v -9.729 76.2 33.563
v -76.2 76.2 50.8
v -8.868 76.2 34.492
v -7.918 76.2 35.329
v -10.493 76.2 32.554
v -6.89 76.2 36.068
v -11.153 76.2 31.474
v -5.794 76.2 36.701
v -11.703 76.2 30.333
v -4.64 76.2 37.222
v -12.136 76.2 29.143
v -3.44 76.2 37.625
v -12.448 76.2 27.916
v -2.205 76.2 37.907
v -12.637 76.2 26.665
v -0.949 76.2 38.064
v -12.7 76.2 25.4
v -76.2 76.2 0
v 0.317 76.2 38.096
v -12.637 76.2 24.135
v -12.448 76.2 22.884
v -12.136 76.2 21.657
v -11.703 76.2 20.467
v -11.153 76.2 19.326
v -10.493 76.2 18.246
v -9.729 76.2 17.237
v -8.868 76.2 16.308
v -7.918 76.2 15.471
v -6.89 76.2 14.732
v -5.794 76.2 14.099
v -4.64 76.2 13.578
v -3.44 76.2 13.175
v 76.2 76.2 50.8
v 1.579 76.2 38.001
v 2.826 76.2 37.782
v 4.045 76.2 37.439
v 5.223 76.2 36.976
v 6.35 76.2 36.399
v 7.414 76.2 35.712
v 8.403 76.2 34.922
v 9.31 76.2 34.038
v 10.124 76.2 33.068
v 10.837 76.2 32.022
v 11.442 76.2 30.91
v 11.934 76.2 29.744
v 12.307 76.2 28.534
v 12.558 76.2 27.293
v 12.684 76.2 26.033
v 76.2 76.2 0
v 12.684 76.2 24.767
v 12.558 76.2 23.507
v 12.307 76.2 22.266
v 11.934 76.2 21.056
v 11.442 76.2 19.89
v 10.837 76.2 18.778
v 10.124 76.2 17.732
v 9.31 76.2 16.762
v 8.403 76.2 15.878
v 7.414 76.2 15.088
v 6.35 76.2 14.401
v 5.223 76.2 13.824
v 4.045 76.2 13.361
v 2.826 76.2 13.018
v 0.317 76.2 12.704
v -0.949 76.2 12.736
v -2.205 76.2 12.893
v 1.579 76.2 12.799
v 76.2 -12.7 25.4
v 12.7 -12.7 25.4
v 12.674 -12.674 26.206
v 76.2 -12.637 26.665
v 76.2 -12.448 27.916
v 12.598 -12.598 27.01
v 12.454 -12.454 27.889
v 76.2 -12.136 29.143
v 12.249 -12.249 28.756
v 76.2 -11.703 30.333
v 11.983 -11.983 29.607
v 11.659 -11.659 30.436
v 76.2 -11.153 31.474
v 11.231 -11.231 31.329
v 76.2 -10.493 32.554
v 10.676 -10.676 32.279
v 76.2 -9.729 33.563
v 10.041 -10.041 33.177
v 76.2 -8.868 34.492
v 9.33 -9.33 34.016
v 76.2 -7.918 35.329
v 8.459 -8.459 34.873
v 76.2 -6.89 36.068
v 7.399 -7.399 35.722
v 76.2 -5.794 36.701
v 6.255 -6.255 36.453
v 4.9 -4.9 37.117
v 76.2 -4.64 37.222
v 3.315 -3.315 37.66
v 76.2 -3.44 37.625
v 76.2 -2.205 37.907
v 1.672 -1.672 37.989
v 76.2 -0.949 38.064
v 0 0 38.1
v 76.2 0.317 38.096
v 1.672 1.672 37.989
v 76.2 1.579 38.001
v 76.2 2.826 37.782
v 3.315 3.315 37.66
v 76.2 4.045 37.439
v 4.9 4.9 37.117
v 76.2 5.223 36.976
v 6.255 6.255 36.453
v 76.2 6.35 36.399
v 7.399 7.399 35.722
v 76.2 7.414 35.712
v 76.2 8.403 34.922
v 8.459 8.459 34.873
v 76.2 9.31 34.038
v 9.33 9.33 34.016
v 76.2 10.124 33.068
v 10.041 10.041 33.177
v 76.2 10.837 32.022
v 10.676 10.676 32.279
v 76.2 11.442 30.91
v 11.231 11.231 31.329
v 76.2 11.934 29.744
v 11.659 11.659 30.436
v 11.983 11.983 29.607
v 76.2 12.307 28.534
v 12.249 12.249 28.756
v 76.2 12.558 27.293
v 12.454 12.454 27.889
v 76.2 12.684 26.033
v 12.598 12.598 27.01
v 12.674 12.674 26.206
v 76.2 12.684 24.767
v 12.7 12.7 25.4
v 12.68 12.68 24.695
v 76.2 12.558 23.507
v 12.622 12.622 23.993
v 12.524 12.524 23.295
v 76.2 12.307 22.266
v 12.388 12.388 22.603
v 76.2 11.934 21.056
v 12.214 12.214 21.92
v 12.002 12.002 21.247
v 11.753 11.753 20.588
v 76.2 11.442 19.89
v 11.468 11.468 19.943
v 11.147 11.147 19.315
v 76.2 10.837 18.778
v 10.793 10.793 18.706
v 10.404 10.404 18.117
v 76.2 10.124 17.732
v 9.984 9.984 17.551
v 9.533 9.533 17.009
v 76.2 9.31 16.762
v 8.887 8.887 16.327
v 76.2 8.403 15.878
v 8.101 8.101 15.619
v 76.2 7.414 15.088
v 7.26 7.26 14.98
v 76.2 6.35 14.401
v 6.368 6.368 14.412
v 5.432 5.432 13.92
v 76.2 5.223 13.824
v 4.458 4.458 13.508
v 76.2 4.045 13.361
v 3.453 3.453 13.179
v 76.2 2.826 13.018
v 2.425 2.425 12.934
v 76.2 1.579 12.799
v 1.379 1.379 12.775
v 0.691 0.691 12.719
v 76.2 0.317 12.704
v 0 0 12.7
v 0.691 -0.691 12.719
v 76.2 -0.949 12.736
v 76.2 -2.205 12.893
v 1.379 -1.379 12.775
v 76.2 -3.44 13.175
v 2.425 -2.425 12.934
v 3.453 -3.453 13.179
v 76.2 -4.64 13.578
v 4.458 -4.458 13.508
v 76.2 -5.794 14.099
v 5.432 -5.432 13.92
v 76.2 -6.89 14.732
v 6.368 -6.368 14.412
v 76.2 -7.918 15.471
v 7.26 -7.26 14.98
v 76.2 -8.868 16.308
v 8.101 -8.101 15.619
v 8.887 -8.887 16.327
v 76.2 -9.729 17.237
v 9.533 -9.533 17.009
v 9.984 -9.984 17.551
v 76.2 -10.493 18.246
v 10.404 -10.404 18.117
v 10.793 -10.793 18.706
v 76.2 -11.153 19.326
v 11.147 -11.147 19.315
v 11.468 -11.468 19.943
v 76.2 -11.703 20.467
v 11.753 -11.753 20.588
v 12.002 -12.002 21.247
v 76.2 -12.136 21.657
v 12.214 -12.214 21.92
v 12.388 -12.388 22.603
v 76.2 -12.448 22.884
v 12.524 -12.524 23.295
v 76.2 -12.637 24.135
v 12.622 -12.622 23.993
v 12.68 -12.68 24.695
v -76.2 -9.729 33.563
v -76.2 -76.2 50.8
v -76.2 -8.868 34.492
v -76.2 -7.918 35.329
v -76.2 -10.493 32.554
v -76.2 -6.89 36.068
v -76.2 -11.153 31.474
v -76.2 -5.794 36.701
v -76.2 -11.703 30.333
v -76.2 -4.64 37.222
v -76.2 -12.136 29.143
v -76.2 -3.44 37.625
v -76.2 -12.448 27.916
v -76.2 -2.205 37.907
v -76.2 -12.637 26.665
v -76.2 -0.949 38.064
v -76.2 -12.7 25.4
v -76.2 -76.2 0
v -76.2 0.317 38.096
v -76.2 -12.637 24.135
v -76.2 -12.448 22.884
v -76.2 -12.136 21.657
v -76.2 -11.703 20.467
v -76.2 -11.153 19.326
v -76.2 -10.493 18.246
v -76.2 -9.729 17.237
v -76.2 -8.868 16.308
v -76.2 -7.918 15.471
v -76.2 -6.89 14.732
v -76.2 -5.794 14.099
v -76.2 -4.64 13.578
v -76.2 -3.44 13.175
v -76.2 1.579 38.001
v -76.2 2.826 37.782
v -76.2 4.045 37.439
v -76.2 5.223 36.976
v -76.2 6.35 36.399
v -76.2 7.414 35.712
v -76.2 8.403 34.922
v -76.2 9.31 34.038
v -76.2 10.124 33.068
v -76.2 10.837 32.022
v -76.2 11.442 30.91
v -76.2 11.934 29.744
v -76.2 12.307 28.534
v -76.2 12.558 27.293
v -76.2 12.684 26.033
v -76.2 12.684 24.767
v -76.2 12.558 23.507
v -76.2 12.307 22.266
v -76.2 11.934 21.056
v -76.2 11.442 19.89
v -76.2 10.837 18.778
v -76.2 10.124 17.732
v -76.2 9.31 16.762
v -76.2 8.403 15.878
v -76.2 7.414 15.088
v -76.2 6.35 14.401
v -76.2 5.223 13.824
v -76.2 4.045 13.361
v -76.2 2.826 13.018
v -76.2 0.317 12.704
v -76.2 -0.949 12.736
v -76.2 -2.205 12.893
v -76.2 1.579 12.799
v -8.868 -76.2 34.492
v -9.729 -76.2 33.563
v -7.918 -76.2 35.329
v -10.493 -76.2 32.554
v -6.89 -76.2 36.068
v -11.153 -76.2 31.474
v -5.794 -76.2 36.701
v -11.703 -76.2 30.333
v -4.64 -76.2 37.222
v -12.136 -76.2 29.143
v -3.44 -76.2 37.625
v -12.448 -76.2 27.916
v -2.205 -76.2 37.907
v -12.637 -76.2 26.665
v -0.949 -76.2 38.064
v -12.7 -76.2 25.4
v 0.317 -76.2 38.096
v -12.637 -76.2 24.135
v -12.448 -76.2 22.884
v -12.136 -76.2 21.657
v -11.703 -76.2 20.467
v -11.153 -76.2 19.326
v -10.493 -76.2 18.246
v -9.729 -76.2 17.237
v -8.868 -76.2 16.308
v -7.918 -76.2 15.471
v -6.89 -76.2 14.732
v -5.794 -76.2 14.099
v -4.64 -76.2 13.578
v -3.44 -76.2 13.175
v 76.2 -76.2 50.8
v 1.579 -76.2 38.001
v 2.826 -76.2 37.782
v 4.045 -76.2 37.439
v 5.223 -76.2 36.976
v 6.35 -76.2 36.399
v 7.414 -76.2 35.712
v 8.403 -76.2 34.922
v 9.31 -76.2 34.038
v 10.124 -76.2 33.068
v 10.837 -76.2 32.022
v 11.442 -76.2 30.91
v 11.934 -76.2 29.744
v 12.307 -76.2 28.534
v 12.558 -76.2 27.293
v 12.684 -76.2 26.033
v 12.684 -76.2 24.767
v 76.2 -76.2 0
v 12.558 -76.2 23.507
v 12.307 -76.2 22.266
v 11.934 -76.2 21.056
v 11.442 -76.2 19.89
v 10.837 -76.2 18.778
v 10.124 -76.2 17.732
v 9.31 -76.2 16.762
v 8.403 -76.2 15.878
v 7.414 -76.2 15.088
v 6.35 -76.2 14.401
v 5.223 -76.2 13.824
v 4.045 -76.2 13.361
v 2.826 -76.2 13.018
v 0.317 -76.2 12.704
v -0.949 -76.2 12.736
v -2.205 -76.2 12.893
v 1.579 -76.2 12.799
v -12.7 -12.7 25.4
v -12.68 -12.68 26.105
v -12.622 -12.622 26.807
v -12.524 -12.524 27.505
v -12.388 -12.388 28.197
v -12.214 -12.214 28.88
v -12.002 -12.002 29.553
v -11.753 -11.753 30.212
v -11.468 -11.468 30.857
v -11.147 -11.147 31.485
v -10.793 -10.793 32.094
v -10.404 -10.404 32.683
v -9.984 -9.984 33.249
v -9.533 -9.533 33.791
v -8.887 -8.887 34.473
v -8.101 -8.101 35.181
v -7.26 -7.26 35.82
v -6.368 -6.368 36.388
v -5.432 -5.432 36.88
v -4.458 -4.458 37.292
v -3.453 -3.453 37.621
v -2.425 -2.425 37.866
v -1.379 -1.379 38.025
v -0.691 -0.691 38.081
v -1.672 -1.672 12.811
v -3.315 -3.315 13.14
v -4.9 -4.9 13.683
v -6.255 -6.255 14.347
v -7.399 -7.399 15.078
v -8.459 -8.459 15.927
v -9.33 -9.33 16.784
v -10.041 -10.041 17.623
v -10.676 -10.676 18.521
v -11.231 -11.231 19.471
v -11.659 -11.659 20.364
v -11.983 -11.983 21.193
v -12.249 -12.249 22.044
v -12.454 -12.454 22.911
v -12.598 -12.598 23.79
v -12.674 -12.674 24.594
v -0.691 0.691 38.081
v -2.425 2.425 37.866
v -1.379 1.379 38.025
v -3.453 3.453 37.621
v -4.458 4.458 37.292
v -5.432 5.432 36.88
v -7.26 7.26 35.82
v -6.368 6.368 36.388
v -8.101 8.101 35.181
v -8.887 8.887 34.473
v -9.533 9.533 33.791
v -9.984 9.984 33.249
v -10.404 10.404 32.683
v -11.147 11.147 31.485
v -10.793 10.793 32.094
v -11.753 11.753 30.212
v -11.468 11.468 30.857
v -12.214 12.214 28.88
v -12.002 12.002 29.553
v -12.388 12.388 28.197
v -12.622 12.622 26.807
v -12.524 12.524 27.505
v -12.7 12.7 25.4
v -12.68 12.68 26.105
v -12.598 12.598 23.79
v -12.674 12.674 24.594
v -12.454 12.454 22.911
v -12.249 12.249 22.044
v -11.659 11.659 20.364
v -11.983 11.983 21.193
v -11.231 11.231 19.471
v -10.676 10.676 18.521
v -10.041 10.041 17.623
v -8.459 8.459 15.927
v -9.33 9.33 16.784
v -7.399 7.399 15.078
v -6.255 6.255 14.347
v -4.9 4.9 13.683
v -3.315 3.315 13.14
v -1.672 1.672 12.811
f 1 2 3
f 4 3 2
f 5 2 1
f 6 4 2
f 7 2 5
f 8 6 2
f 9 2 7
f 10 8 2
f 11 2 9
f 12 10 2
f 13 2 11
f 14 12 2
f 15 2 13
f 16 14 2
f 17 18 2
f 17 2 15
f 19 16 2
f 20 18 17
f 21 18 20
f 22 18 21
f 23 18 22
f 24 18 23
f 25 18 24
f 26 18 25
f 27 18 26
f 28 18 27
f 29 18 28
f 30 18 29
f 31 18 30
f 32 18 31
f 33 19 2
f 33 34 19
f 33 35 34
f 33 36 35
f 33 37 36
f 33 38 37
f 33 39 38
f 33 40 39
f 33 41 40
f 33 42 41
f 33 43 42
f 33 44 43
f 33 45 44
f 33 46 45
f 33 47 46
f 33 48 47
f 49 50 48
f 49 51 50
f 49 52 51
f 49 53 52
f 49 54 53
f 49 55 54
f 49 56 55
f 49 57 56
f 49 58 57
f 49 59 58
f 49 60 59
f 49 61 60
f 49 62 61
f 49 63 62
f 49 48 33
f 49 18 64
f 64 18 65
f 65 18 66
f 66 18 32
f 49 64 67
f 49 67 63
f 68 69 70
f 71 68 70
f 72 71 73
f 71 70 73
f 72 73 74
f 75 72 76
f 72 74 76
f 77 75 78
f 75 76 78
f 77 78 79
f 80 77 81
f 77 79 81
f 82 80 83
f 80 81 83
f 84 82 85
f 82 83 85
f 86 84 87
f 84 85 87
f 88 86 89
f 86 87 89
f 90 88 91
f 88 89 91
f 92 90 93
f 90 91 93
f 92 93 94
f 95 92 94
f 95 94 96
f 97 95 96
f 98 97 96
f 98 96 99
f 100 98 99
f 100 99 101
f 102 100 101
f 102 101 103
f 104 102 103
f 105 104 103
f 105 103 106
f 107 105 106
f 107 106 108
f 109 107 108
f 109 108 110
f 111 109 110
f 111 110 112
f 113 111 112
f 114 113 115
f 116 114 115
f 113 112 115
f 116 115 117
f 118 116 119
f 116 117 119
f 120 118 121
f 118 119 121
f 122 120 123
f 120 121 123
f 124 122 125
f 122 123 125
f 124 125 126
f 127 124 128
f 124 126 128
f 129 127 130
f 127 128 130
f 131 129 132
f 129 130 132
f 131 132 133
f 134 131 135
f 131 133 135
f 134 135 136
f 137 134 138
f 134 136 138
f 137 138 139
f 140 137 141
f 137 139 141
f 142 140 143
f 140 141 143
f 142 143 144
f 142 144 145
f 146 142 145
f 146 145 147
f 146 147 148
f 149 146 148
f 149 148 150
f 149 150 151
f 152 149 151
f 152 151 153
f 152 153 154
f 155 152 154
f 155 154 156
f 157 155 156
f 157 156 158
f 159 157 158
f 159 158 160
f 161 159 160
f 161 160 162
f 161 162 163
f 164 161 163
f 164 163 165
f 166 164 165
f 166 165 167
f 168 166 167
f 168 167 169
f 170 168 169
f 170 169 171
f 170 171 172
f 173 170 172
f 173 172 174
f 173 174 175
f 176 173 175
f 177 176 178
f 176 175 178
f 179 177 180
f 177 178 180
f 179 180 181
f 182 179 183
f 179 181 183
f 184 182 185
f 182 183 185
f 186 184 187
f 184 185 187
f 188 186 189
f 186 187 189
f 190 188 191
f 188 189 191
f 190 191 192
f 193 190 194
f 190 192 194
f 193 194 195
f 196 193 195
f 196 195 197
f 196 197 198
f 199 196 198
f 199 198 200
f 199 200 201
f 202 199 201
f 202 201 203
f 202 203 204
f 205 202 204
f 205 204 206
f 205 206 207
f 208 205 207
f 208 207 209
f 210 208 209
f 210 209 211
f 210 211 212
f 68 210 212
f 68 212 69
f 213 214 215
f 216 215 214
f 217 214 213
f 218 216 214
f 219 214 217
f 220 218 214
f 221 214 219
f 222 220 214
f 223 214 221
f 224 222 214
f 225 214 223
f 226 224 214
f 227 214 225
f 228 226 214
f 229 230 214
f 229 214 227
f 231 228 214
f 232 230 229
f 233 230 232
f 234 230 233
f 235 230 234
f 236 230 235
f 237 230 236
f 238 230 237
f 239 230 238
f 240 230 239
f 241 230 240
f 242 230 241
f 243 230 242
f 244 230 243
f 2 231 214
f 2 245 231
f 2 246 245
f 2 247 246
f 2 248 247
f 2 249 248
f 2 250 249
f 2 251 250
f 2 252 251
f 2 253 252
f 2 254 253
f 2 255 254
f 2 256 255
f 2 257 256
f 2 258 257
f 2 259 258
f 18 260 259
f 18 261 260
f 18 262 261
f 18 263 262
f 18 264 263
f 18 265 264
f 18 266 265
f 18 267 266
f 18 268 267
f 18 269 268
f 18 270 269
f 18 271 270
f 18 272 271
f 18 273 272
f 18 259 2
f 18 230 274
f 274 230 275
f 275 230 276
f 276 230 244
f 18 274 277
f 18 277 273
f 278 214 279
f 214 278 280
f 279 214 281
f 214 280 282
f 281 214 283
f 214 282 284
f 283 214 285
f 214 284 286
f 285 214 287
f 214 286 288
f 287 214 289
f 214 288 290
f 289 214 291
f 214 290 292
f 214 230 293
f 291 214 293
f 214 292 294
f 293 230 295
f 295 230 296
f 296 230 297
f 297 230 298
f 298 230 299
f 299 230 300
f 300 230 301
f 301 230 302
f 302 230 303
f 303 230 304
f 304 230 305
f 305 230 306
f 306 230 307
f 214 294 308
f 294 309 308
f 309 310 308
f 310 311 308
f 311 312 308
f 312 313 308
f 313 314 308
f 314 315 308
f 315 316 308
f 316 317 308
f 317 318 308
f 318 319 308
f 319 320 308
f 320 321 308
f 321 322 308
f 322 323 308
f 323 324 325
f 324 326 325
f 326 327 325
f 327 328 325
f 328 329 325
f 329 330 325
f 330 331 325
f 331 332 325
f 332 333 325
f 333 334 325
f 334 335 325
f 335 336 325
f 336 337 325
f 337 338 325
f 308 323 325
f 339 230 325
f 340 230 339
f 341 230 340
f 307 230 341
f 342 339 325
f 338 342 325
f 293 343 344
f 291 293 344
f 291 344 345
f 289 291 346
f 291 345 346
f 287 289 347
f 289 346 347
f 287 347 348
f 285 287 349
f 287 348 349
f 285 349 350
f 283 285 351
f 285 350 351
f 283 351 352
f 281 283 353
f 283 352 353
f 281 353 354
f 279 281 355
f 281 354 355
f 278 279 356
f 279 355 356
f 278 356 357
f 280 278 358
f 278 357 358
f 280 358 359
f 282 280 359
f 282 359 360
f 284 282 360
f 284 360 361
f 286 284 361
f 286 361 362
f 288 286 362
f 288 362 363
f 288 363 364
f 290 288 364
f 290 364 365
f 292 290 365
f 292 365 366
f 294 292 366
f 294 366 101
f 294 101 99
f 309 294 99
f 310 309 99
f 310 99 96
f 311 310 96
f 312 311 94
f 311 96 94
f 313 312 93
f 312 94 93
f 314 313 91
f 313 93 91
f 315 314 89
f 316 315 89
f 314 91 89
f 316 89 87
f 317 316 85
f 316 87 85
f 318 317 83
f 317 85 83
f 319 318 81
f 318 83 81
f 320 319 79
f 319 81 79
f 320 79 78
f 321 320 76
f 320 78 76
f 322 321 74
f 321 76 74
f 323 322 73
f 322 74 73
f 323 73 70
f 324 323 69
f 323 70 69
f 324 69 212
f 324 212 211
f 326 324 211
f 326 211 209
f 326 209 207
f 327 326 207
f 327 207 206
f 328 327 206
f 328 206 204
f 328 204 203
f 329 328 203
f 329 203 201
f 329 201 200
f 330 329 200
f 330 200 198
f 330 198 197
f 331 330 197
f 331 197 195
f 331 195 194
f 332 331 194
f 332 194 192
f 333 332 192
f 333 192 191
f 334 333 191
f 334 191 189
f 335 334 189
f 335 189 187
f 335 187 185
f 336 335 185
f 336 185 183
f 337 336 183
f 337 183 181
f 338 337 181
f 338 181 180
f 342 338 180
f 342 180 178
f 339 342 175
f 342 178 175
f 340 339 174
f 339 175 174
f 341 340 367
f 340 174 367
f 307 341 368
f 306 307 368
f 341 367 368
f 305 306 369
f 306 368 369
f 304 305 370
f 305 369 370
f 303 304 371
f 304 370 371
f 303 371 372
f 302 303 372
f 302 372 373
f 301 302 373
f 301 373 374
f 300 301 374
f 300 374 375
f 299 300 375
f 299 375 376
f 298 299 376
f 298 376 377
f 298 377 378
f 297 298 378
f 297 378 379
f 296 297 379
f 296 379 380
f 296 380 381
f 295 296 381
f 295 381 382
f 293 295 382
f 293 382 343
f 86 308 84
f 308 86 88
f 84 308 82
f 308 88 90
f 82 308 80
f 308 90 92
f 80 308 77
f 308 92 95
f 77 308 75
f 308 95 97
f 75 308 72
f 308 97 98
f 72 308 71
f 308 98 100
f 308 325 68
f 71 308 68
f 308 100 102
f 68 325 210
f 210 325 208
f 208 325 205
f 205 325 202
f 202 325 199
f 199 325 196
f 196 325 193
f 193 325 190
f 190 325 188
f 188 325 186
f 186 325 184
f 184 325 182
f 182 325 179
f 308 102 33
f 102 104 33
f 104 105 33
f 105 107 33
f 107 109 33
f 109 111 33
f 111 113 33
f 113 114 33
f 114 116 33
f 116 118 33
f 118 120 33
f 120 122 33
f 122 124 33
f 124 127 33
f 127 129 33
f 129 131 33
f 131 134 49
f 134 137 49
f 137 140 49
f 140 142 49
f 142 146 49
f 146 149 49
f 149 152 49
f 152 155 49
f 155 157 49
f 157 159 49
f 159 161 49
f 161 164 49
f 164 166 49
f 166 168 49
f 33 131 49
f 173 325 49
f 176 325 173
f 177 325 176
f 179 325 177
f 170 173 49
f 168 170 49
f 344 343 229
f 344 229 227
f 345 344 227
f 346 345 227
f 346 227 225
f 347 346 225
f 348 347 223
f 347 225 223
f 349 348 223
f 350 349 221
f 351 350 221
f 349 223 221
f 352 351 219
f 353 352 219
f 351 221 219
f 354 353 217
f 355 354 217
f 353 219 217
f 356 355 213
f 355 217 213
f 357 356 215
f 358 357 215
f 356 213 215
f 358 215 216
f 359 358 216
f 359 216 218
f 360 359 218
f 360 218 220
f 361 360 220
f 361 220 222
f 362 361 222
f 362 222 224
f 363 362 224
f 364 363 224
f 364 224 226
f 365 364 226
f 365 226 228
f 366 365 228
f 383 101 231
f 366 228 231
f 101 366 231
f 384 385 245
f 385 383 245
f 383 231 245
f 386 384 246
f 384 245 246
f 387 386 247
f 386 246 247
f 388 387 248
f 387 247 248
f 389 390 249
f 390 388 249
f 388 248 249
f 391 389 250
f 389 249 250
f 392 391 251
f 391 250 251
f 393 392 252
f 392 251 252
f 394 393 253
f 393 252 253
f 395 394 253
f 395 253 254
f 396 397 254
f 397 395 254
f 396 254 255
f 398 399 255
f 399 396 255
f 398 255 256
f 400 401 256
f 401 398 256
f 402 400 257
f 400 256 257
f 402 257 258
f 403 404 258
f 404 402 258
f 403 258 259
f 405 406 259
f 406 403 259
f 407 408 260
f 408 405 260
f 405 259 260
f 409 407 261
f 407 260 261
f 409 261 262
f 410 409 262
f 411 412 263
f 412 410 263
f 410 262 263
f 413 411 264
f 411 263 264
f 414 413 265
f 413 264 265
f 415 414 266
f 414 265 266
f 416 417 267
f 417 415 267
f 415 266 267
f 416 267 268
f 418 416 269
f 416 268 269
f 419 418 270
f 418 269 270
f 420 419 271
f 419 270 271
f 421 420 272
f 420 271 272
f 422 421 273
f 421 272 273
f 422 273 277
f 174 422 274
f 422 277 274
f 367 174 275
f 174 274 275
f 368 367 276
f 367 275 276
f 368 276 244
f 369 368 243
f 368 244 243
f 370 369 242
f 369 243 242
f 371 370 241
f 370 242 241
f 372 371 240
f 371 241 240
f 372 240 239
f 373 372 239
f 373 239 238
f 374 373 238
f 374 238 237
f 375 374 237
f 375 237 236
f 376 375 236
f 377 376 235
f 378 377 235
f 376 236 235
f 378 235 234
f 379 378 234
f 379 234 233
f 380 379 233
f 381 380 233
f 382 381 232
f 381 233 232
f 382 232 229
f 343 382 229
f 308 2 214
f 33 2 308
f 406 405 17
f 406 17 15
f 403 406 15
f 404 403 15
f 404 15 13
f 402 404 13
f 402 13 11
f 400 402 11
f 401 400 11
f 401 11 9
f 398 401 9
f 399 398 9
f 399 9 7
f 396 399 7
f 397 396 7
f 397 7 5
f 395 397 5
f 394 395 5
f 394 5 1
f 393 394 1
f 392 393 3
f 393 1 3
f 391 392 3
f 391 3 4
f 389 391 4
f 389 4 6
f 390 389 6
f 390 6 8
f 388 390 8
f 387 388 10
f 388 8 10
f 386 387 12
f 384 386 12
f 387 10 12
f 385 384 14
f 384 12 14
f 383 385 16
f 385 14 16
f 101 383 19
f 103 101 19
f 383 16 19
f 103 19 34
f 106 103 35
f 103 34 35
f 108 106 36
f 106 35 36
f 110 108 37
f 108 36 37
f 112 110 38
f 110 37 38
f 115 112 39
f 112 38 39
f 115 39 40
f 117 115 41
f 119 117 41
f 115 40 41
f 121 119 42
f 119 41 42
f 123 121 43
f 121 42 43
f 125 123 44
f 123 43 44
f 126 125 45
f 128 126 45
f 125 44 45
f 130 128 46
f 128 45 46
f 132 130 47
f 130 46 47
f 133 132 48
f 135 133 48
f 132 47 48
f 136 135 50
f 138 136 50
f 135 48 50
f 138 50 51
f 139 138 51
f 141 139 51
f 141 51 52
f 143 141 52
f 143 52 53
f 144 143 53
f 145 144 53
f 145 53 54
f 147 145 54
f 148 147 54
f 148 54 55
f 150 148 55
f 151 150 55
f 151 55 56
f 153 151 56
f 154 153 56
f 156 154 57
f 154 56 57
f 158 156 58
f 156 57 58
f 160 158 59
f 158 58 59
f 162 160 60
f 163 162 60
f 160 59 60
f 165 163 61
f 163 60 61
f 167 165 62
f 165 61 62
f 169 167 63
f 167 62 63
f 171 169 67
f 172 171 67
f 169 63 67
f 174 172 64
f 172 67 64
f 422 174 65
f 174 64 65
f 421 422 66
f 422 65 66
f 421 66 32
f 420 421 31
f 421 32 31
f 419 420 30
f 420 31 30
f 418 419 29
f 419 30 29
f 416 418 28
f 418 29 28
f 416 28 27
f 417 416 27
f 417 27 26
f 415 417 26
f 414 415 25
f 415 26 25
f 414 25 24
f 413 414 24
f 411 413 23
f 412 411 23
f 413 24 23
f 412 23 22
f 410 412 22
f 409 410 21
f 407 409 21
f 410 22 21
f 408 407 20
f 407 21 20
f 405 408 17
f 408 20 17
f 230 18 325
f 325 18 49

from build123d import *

# Parameters (mm, degrees)
F0_W     = 152.4
F0_H     = 152.4
F1_DEPTH = 50.8
F3_R     = 12.7
F4_DEPTH = 152.4
F2_R     = 12.7
F5_DEPTH = 152.4


with BuildPart() as f1:
    # F0 (on Top) → F1 (new body)
    with BuildSketch(Plane.XY):
        Rectangle(F0_W, F0_H)
    extrude(amount=F1_DEPTH)

    # F3 (on face) → F4 (cut)
    with BuildSketch(Plane(origin=(0, 76.2, 0), x_dir=(-1, 0, 0), z_dir=(0, 1, 0))):
        with Locations((0, 25.4)):
            Circle(F3_R)
    extrude(amount=-F4_DEPTH, mode=Mode.SUBTRACT)

    # F2 (on face) → F5 (cut)
    with BuildSketch(Plane(origin=(-76.2, 0, 0), x_dir=(0, -1, 0), z_dir=(-1, 0, 0))):
        with Locations((0, 25.4)):
            Circle(F2_R)
    extrude(amount=-F5_DEPTH, mode=Mode.SUBTRACT)


solid = f1.part
